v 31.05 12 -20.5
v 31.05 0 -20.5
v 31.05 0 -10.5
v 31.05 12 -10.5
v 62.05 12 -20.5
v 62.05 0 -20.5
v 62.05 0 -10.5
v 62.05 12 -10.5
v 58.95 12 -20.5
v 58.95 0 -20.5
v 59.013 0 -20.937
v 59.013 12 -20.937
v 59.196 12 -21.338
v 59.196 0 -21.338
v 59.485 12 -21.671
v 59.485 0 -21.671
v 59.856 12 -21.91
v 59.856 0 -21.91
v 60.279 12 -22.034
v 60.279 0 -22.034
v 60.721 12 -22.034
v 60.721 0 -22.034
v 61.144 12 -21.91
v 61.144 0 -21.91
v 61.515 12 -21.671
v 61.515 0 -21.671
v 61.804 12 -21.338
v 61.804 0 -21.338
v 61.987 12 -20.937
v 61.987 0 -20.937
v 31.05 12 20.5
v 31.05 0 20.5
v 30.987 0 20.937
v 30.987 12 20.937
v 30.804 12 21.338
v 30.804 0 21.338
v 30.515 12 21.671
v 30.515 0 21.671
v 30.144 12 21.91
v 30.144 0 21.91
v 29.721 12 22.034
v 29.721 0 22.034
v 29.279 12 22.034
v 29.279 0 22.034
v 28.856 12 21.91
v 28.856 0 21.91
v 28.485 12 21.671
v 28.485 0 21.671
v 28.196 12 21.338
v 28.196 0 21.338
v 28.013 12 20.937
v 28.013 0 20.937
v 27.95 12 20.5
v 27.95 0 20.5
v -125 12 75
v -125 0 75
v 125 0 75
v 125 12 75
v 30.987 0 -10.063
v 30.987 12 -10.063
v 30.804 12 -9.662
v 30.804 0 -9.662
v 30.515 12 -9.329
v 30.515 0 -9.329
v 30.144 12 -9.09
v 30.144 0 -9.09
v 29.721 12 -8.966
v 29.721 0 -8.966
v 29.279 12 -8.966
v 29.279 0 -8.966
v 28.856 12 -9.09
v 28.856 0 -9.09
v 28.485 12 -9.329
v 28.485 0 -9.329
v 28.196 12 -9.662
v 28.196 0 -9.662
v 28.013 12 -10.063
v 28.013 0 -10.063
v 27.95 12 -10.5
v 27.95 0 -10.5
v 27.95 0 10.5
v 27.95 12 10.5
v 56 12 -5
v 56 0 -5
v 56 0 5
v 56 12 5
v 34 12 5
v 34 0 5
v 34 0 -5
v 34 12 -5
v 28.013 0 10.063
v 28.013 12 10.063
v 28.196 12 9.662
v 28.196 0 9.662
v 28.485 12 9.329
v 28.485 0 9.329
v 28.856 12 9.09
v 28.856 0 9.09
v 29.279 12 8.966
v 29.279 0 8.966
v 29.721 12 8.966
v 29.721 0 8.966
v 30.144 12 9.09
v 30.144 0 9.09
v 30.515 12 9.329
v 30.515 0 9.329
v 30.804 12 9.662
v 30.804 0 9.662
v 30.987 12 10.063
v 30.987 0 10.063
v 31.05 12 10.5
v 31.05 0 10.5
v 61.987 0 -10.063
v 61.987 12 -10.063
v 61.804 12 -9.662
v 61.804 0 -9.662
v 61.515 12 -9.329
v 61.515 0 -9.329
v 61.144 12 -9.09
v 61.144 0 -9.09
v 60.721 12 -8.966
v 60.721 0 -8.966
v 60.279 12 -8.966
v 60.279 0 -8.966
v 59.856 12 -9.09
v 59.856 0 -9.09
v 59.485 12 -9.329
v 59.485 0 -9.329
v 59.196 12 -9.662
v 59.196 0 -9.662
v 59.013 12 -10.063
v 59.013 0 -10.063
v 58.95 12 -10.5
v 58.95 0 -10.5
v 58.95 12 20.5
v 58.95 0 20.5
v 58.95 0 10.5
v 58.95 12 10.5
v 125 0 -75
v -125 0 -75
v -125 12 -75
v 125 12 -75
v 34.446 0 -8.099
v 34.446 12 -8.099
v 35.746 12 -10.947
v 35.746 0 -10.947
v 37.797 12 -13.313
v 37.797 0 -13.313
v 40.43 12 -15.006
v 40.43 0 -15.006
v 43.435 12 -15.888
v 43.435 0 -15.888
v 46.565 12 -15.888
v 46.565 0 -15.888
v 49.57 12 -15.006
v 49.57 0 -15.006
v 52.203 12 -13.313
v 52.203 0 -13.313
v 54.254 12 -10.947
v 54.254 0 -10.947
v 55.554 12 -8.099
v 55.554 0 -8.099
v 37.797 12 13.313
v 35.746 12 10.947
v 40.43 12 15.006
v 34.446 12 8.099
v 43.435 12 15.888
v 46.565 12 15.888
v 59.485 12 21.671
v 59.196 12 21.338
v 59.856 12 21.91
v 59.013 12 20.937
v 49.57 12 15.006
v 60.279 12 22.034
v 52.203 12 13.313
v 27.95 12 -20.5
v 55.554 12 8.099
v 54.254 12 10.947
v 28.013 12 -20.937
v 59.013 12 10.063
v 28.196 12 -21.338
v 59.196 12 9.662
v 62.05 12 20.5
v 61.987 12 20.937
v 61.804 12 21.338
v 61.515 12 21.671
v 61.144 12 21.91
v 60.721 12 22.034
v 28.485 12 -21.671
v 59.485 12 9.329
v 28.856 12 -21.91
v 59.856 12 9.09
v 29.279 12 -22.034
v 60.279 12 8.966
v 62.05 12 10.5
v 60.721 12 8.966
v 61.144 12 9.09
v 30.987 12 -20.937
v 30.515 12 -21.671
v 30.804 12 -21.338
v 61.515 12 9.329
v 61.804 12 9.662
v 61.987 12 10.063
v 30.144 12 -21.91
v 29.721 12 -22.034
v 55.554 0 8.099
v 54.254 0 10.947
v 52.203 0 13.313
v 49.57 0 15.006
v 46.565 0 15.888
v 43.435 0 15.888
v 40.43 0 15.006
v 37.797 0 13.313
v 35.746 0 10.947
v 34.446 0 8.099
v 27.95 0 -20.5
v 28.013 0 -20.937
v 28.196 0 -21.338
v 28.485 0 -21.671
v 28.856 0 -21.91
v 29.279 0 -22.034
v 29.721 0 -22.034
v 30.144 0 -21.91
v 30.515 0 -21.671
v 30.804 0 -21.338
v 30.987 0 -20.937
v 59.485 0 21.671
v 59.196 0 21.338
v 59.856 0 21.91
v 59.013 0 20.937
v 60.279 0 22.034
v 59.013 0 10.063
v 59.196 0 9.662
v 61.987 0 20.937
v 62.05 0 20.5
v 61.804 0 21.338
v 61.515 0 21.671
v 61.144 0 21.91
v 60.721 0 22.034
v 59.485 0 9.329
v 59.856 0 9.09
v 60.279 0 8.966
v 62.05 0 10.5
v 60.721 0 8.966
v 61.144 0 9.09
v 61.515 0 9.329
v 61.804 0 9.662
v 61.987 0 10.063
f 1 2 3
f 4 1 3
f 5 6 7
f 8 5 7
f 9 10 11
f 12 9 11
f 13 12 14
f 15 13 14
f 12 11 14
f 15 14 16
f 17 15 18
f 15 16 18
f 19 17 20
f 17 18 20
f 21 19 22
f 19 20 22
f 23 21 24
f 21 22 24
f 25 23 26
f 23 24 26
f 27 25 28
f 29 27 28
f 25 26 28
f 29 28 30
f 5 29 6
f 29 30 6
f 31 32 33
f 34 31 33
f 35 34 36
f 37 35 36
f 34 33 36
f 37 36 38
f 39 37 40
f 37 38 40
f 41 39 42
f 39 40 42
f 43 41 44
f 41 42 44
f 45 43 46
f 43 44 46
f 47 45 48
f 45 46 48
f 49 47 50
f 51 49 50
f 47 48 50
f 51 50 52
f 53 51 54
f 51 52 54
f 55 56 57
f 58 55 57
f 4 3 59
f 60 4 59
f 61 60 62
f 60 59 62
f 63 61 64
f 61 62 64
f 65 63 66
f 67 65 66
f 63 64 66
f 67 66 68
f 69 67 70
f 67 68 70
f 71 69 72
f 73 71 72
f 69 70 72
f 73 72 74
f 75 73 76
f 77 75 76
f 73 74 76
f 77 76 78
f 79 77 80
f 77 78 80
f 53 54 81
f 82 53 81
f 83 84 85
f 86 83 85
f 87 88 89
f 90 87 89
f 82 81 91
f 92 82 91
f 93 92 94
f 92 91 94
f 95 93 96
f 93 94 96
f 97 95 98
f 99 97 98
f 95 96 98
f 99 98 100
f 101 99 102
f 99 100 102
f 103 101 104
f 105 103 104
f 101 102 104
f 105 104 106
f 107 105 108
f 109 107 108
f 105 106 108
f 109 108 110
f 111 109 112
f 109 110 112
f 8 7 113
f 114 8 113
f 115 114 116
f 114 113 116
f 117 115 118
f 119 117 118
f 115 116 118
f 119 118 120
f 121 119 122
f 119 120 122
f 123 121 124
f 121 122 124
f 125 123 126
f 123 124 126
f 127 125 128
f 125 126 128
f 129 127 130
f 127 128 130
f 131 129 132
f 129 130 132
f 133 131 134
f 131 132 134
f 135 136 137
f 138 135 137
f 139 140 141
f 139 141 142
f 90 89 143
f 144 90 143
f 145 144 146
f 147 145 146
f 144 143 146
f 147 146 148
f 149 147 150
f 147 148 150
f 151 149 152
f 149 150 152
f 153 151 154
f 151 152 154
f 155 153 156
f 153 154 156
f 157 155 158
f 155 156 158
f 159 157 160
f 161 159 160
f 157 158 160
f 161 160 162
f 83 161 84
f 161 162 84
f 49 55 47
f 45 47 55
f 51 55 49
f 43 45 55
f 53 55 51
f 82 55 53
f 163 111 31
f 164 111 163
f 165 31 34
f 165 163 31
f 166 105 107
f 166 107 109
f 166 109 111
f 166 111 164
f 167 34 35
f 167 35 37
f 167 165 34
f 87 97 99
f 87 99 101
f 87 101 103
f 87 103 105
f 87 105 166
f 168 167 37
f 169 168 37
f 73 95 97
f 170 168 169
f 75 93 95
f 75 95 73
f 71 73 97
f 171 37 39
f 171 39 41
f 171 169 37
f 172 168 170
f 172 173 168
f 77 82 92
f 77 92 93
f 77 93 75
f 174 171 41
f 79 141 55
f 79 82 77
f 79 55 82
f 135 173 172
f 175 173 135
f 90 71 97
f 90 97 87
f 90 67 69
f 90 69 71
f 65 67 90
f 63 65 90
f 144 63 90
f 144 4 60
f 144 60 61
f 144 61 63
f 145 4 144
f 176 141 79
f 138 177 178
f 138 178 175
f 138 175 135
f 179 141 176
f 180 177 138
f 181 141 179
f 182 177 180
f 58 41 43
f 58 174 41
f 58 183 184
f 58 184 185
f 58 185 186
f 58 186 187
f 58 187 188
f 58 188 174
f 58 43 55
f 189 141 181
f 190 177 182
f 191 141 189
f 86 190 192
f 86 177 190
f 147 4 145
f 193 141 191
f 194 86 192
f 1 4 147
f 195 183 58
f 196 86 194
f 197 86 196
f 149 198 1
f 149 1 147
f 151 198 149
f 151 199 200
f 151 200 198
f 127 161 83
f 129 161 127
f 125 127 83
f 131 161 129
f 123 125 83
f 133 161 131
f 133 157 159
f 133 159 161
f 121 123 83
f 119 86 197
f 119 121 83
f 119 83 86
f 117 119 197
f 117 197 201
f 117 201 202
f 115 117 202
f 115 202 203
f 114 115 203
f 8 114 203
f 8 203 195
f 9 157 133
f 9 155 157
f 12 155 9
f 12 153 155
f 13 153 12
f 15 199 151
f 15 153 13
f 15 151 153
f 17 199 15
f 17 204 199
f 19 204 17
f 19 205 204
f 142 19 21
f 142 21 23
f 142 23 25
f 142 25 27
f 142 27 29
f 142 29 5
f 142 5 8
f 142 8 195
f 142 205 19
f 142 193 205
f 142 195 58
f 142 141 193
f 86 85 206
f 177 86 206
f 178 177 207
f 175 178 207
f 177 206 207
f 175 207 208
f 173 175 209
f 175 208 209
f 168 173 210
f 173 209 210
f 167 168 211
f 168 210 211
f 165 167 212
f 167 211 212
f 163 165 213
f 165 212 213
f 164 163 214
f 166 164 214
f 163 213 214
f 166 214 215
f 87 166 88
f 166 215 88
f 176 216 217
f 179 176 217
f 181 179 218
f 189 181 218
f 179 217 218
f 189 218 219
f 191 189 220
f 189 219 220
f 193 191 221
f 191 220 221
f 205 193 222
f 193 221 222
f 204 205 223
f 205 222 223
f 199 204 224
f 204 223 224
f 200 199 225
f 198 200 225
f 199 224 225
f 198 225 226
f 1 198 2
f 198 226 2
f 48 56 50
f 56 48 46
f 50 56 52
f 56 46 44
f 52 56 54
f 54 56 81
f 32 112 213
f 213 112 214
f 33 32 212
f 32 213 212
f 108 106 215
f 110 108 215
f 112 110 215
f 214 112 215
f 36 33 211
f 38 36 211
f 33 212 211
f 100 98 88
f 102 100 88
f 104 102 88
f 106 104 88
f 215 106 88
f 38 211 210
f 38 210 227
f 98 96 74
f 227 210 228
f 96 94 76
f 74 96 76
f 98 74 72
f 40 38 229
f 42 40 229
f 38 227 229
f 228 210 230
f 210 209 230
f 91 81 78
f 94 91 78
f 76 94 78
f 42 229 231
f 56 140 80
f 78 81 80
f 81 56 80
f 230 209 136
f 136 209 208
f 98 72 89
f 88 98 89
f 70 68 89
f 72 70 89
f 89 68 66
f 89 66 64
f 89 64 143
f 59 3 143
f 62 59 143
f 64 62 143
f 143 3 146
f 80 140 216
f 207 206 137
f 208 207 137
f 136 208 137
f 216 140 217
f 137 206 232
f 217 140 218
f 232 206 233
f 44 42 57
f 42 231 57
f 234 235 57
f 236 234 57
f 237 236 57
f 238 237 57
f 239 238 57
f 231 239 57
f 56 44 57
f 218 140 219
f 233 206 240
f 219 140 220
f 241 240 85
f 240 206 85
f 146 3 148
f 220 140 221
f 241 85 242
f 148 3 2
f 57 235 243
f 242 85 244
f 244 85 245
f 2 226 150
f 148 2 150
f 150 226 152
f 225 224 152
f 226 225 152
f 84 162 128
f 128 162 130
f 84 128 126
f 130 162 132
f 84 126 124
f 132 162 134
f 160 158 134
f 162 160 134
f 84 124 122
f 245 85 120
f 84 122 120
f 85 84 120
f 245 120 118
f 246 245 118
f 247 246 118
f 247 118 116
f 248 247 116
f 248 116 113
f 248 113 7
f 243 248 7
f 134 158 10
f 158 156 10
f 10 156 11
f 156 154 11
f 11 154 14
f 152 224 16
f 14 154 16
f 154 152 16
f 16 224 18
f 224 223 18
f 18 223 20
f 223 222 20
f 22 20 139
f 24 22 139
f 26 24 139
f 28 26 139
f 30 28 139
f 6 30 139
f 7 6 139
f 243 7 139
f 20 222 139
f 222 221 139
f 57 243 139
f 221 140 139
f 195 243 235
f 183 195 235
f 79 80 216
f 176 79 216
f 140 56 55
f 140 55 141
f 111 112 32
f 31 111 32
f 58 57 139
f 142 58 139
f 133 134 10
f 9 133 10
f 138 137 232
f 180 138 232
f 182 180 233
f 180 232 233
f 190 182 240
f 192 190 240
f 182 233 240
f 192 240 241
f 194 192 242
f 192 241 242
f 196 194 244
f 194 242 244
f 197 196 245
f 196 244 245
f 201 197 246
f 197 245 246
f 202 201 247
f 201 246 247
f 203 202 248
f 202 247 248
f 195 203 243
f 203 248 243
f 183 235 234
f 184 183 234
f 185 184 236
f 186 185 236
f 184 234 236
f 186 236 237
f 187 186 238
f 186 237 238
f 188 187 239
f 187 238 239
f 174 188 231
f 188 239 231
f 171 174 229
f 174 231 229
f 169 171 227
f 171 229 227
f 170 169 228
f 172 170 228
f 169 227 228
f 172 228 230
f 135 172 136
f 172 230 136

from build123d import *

# Parameters (mm, degrees)
SKIZZE1_W                       = 250
SKIZZE1_H                       = 150
AUFSATZ_LINEAR_AUSTRAGEN1_DEPTH = 12


with BuildPart() as part:
    # Skizze1 → Aufsatz-Linear austragen1 (new body)
    with BuildSketch(Plane(origin=(0, 0, 0), x_dir=(1, 0, 0), z_dir=(0, 1, 0))):
        Rectangle(SKIZZE1_W, SKIZZE1_H)
        with BuildLine():
            Line((27.95, 10.5), (27.95, 20.5))
            ThreePointArc((27.95, 20.5), (29.5, 22.05), (31.05, 20.5))
            Line((31.05, 20.5), (31.05, 10.5))
            ThreePointArc((31.05, 10.5), (29.5, 8.95), (27.95, 10.5))
        make_face(mode=Mode.SUBTRACT)
        with BuildLine():
            Line((62.05, 20.5), (62.05, 10.5))
            ThreePointArc((62.05, 10.5), (60.5, 8.95), (58.95, 10.5))
            Line((58.95, 10.5), (58.95, 20.5))
            ThreePointArc((58.95, 20.5), (60.5, 22.05), (62.05, 20.5))
        make_face(mode=Mode.SUBTRACT)
        with BuildLine():
            Line((58.95, -20.5), (58.95, -10.5))
            ThreePointArc((58.95, -10.5), (60.5, -8.95), (62.05, -10.5))
            Line((62.05, -10.5), (62.05, -20.5))
            ThreePointArc((62.05, -20.5), (60.5, -22.05), (58.95, -20.5))
        make_face(mode=Mode.SUBTRACT)
        with BuildLine():
            Line((27.95, -20.5), (27.95, -10.5))
            ThreePointArc((27.95, -10.5), (29.5, -8.95), (31.05, -10.5))
            Line((31.05, -10.5), (31.05, -20.5))
            ThreePointArc((31.05, -20.5), (29.5, -22.05), (27.95, -20.5))
        make_face(mode=Mode.SUBTRACT)
        with BuildLine():
            Line((56, 5), (56, -5))
            ThreePointArc((56, -5), (45, -16), (34, -5))
            Line((34, -5), (34, 5))
            ThreePointArc((34, 5), (45, 16), (56, 5))
        make_face(mode=Mode.SUBTRACT)
    extrude(amount=AUFSATZ_LINEAR_AUSTRAGEN1_DEPTH)


solid = part.part
